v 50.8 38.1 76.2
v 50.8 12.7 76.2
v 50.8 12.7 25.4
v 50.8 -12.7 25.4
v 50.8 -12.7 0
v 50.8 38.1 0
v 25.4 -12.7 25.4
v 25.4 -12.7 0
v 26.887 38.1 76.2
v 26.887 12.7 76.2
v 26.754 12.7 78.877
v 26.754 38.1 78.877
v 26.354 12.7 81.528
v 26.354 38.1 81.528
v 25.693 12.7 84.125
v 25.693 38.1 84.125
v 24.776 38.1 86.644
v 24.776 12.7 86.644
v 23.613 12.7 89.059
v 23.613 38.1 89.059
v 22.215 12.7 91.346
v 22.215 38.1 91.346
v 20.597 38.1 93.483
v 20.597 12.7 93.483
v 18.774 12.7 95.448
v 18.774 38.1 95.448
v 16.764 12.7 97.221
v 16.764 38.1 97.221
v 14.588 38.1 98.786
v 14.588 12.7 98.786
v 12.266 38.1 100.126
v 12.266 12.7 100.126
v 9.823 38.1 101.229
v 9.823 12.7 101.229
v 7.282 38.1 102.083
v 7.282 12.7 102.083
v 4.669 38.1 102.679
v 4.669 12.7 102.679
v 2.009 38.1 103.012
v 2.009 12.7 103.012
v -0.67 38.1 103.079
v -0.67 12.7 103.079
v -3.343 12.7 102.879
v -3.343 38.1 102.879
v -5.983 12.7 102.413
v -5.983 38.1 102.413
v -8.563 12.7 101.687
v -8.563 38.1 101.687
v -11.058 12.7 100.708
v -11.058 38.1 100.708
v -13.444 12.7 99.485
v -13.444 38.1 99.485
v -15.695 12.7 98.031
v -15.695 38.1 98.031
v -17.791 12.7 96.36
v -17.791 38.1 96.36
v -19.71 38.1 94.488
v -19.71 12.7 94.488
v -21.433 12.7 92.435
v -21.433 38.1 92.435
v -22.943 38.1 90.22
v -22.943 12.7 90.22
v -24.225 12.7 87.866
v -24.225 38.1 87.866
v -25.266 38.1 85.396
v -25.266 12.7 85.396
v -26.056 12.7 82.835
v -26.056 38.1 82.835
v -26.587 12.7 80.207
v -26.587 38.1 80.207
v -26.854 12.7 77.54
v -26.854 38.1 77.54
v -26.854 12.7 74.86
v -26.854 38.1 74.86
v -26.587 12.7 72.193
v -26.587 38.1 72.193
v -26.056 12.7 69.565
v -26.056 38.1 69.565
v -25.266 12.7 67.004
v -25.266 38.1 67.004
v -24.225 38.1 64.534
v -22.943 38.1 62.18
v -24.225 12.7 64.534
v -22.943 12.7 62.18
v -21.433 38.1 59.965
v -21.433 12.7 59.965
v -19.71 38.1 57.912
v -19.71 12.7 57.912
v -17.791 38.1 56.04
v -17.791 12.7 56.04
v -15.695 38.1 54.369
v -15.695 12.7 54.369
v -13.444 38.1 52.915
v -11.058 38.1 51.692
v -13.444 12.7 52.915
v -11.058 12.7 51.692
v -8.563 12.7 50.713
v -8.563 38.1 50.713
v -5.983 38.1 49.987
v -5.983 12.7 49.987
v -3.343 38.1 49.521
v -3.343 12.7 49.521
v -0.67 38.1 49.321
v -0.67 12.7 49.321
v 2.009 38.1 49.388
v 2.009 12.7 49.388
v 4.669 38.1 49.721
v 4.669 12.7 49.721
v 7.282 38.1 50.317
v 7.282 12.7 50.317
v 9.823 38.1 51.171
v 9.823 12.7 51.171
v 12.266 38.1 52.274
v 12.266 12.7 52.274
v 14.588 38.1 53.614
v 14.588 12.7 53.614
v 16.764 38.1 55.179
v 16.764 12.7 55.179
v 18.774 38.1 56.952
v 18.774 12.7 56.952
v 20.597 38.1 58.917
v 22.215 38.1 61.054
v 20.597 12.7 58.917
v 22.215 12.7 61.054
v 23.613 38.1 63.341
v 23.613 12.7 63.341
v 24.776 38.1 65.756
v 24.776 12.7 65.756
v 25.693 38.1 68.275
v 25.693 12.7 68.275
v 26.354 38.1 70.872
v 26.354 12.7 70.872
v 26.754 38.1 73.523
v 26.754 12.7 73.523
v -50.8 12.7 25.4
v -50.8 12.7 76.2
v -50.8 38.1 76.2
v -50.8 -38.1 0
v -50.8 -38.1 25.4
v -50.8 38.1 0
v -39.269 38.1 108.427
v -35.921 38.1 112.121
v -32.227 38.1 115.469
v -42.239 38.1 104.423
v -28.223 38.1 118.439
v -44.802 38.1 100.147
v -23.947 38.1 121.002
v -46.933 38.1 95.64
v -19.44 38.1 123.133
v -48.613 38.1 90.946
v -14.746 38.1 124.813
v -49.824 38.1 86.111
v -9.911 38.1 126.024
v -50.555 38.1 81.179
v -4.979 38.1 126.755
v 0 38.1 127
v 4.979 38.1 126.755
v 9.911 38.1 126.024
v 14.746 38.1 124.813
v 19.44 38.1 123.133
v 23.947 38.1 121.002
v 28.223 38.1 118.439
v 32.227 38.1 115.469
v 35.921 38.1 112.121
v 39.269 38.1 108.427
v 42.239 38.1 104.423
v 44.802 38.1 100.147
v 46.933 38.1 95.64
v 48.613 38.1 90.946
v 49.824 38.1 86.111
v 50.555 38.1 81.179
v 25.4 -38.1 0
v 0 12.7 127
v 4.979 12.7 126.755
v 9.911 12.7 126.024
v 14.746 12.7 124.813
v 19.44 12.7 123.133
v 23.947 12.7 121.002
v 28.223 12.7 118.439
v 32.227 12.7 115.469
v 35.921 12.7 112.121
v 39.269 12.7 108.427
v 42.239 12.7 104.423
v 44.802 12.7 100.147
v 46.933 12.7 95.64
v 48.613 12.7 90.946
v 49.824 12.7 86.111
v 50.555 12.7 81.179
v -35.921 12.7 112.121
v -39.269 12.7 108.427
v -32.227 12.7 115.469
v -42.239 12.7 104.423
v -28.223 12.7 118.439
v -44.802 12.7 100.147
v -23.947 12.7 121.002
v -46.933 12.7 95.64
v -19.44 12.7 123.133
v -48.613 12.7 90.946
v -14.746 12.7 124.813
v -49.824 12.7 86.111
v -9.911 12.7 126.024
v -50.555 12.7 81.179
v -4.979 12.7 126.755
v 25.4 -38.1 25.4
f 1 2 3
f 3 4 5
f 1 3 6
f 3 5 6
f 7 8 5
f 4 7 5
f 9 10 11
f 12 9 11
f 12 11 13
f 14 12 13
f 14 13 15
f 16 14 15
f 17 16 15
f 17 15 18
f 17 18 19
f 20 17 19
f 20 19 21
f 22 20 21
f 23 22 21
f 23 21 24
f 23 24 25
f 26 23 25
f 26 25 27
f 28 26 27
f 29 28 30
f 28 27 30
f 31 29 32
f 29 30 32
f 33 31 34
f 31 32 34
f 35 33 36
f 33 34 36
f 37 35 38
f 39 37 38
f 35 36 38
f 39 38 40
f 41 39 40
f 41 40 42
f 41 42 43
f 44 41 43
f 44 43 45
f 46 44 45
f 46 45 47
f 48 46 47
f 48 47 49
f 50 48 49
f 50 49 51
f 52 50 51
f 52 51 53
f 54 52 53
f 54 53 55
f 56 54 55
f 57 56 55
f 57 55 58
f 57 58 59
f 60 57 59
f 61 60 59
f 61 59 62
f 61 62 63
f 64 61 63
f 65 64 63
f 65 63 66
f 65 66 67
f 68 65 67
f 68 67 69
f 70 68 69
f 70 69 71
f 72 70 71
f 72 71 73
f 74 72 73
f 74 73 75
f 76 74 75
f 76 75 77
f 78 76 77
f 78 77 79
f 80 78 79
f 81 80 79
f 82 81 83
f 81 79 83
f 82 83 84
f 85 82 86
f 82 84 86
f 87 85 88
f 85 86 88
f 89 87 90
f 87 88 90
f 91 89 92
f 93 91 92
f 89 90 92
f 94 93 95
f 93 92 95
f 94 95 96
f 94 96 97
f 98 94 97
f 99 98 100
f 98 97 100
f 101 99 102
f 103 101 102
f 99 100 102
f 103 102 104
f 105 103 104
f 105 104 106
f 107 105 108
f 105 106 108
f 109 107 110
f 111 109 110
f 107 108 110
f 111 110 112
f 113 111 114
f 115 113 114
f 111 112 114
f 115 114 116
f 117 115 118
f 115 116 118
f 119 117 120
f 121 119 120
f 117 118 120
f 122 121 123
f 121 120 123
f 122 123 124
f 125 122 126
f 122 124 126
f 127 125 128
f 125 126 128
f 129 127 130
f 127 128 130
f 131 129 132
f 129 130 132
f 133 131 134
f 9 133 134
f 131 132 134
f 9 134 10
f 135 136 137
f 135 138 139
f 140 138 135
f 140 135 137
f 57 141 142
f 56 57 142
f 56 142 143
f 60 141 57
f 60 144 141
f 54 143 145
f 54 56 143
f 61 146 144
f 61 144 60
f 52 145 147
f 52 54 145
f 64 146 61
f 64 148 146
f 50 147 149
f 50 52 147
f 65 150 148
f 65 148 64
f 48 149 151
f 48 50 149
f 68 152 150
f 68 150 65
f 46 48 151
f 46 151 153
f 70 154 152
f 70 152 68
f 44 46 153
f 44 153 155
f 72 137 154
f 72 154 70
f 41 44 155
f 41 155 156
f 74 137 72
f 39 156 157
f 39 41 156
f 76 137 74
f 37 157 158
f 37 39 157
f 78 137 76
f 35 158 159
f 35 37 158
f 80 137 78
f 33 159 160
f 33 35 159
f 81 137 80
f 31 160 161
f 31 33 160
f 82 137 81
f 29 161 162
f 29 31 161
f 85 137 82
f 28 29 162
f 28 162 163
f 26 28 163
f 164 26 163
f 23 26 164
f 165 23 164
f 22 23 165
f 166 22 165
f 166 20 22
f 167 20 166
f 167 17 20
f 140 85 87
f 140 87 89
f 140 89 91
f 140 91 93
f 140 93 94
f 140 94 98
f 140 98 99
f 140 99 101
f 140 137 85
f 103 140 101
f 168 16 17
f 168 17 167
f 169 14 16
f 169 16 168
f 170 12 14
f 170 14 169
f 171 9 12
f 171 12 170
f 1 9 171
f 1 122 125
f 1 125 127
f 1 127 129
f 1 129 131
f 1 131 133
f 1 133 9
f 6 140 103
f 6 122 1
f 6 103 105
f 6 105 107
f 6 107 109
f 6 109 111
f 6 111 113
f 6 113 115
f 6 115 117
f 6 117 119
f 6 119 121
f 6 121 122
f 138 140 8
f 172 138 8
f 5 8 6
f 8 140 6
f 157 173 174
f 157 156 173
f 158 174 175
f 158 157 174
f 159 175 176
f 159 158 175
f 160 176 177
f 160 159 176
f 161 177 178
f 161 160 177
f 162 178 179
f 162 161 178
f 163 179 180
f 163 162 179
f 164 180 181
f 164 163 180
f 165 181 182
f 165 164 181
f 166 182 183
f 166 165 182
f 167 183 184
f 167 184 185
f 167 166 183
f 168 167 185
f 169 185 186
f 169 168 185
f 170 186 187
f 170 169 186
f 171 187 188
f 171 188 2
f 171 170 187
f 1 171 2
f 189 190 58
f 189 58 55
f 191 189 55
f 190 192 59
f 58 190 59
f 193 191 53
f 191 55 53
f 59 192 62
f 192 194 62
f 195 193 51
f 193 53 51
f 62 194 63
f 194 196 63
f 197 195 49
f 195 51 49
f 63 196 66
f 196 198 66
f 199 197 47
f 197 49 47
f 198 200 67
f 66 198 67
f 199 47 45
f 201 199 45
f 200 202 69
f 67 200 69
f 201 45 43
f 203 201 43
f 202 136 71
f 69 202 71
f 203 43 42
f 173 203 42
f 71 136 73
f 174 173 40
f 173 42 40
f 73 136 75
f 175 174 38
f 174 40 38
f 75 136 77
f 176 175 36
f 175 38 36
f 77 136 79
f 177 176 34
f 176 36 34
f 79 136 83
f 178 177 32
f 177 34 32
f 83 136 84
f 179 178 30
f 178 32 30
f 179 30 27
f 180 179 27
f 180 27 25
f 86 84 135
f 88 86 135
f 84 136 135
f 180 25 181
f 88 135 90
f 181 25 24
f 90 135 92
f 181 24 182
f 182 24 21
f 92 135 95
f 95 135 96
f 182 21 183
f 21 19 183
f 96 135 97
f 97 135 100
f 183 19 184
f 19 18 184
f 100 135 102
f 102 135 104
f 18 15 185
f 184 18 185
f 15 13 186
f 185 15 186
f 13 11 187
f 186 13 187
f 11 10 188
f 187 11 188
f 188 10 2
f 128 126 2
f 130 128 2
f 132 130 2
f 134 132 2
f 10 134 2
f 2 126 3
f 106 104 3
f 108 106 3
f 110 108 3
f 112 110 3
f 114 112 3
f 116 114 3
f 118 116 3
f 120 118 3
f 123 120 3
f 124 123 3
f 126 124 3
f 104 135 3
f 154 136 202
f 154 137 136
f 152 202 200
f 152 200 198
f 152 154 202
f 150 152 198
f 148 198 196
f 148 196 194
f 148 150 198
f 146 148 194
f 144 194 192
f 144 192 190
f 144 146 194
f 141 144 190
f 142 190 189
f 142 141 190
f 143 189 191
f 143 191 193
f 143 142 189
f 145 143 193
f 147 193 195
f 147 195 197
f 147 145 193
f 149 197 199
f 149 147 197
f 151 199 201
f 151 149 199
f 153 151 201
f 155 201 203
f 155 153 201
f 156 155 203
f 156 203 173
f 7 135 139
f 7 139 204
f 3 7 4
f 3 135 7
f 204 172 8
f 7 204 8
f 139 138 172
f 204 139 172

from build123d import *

# Parameters (mm, degrees)
F0_W     = 101.6
F0_H     = 76.2
F1_DEPTH = 25.4
F2_W     = 25.4
F2_H     = 25.4
F3_DEPTH = 25.401
F4_W     = 101.6
F4_H     = 25.4
F5_DEPTH = 101.6
F6_R     = 50.8
F7_R     = 50.79999
F8_R     = 26.8874983084
F9_DEPTH = 25.401


# Not quite as in the source:
# - a fillet or chamfer is up to 0.001 mm smaller than in the source, because OpenCascade refuses the exact size


with BuildPart() as f1:
    # F0 (on Top) → F1 (new body)
    with BuildSketch(Plane.XY):
        Rectangle(F0_W, F0_H)
    extrude(amount=F1_DEPTH)

    # F2 (on face) → F3 (cut, through all)
    with BuildSketch(Plane.XY.offset(25.4)):
        with Locations((38.1, -25.4)):
            Rectangle(F2_W, F2_H)
    extrude(amount=-F3_DEPTH, mode=Mode.SUBTRACT)

    # F4 (on face) → F5 (join)
    with BuildSketch(Plane.XY.offset(25.4)):
        with Locations((0, 25.4)):
            Rectangle(F4_W, F4_H)
    extrude(amount=F5_DEPTH)

    # F6
    f6_edges = [f1.edges().sort_by_distance(p)[0] for p in [
        (-50.8, 25.4, 127),
    ]]
    fillet(f6_edges, radius=F6_R)

    # F7 (radius 50.8 in the source; OpenCascade refuses exactly that, so slightly less here)
    f7_edges = [f1.edges().sort_by_distance(p)[0] for p in [
        (50.8, 25.4, 127),
    ]]
    fillet(f7_edges, radius=F7_R)

    # F8 (on face) → F9 (cut, through all)
    with BuildSketch(Plane.XZ.offset(-12.7)):
        with Locations((0, 76.2)):
            Circle(F8_R)
    extrude(amount=-F9_DEPTH, mode=Mode.SUBTRACT)


solid = f1.part
